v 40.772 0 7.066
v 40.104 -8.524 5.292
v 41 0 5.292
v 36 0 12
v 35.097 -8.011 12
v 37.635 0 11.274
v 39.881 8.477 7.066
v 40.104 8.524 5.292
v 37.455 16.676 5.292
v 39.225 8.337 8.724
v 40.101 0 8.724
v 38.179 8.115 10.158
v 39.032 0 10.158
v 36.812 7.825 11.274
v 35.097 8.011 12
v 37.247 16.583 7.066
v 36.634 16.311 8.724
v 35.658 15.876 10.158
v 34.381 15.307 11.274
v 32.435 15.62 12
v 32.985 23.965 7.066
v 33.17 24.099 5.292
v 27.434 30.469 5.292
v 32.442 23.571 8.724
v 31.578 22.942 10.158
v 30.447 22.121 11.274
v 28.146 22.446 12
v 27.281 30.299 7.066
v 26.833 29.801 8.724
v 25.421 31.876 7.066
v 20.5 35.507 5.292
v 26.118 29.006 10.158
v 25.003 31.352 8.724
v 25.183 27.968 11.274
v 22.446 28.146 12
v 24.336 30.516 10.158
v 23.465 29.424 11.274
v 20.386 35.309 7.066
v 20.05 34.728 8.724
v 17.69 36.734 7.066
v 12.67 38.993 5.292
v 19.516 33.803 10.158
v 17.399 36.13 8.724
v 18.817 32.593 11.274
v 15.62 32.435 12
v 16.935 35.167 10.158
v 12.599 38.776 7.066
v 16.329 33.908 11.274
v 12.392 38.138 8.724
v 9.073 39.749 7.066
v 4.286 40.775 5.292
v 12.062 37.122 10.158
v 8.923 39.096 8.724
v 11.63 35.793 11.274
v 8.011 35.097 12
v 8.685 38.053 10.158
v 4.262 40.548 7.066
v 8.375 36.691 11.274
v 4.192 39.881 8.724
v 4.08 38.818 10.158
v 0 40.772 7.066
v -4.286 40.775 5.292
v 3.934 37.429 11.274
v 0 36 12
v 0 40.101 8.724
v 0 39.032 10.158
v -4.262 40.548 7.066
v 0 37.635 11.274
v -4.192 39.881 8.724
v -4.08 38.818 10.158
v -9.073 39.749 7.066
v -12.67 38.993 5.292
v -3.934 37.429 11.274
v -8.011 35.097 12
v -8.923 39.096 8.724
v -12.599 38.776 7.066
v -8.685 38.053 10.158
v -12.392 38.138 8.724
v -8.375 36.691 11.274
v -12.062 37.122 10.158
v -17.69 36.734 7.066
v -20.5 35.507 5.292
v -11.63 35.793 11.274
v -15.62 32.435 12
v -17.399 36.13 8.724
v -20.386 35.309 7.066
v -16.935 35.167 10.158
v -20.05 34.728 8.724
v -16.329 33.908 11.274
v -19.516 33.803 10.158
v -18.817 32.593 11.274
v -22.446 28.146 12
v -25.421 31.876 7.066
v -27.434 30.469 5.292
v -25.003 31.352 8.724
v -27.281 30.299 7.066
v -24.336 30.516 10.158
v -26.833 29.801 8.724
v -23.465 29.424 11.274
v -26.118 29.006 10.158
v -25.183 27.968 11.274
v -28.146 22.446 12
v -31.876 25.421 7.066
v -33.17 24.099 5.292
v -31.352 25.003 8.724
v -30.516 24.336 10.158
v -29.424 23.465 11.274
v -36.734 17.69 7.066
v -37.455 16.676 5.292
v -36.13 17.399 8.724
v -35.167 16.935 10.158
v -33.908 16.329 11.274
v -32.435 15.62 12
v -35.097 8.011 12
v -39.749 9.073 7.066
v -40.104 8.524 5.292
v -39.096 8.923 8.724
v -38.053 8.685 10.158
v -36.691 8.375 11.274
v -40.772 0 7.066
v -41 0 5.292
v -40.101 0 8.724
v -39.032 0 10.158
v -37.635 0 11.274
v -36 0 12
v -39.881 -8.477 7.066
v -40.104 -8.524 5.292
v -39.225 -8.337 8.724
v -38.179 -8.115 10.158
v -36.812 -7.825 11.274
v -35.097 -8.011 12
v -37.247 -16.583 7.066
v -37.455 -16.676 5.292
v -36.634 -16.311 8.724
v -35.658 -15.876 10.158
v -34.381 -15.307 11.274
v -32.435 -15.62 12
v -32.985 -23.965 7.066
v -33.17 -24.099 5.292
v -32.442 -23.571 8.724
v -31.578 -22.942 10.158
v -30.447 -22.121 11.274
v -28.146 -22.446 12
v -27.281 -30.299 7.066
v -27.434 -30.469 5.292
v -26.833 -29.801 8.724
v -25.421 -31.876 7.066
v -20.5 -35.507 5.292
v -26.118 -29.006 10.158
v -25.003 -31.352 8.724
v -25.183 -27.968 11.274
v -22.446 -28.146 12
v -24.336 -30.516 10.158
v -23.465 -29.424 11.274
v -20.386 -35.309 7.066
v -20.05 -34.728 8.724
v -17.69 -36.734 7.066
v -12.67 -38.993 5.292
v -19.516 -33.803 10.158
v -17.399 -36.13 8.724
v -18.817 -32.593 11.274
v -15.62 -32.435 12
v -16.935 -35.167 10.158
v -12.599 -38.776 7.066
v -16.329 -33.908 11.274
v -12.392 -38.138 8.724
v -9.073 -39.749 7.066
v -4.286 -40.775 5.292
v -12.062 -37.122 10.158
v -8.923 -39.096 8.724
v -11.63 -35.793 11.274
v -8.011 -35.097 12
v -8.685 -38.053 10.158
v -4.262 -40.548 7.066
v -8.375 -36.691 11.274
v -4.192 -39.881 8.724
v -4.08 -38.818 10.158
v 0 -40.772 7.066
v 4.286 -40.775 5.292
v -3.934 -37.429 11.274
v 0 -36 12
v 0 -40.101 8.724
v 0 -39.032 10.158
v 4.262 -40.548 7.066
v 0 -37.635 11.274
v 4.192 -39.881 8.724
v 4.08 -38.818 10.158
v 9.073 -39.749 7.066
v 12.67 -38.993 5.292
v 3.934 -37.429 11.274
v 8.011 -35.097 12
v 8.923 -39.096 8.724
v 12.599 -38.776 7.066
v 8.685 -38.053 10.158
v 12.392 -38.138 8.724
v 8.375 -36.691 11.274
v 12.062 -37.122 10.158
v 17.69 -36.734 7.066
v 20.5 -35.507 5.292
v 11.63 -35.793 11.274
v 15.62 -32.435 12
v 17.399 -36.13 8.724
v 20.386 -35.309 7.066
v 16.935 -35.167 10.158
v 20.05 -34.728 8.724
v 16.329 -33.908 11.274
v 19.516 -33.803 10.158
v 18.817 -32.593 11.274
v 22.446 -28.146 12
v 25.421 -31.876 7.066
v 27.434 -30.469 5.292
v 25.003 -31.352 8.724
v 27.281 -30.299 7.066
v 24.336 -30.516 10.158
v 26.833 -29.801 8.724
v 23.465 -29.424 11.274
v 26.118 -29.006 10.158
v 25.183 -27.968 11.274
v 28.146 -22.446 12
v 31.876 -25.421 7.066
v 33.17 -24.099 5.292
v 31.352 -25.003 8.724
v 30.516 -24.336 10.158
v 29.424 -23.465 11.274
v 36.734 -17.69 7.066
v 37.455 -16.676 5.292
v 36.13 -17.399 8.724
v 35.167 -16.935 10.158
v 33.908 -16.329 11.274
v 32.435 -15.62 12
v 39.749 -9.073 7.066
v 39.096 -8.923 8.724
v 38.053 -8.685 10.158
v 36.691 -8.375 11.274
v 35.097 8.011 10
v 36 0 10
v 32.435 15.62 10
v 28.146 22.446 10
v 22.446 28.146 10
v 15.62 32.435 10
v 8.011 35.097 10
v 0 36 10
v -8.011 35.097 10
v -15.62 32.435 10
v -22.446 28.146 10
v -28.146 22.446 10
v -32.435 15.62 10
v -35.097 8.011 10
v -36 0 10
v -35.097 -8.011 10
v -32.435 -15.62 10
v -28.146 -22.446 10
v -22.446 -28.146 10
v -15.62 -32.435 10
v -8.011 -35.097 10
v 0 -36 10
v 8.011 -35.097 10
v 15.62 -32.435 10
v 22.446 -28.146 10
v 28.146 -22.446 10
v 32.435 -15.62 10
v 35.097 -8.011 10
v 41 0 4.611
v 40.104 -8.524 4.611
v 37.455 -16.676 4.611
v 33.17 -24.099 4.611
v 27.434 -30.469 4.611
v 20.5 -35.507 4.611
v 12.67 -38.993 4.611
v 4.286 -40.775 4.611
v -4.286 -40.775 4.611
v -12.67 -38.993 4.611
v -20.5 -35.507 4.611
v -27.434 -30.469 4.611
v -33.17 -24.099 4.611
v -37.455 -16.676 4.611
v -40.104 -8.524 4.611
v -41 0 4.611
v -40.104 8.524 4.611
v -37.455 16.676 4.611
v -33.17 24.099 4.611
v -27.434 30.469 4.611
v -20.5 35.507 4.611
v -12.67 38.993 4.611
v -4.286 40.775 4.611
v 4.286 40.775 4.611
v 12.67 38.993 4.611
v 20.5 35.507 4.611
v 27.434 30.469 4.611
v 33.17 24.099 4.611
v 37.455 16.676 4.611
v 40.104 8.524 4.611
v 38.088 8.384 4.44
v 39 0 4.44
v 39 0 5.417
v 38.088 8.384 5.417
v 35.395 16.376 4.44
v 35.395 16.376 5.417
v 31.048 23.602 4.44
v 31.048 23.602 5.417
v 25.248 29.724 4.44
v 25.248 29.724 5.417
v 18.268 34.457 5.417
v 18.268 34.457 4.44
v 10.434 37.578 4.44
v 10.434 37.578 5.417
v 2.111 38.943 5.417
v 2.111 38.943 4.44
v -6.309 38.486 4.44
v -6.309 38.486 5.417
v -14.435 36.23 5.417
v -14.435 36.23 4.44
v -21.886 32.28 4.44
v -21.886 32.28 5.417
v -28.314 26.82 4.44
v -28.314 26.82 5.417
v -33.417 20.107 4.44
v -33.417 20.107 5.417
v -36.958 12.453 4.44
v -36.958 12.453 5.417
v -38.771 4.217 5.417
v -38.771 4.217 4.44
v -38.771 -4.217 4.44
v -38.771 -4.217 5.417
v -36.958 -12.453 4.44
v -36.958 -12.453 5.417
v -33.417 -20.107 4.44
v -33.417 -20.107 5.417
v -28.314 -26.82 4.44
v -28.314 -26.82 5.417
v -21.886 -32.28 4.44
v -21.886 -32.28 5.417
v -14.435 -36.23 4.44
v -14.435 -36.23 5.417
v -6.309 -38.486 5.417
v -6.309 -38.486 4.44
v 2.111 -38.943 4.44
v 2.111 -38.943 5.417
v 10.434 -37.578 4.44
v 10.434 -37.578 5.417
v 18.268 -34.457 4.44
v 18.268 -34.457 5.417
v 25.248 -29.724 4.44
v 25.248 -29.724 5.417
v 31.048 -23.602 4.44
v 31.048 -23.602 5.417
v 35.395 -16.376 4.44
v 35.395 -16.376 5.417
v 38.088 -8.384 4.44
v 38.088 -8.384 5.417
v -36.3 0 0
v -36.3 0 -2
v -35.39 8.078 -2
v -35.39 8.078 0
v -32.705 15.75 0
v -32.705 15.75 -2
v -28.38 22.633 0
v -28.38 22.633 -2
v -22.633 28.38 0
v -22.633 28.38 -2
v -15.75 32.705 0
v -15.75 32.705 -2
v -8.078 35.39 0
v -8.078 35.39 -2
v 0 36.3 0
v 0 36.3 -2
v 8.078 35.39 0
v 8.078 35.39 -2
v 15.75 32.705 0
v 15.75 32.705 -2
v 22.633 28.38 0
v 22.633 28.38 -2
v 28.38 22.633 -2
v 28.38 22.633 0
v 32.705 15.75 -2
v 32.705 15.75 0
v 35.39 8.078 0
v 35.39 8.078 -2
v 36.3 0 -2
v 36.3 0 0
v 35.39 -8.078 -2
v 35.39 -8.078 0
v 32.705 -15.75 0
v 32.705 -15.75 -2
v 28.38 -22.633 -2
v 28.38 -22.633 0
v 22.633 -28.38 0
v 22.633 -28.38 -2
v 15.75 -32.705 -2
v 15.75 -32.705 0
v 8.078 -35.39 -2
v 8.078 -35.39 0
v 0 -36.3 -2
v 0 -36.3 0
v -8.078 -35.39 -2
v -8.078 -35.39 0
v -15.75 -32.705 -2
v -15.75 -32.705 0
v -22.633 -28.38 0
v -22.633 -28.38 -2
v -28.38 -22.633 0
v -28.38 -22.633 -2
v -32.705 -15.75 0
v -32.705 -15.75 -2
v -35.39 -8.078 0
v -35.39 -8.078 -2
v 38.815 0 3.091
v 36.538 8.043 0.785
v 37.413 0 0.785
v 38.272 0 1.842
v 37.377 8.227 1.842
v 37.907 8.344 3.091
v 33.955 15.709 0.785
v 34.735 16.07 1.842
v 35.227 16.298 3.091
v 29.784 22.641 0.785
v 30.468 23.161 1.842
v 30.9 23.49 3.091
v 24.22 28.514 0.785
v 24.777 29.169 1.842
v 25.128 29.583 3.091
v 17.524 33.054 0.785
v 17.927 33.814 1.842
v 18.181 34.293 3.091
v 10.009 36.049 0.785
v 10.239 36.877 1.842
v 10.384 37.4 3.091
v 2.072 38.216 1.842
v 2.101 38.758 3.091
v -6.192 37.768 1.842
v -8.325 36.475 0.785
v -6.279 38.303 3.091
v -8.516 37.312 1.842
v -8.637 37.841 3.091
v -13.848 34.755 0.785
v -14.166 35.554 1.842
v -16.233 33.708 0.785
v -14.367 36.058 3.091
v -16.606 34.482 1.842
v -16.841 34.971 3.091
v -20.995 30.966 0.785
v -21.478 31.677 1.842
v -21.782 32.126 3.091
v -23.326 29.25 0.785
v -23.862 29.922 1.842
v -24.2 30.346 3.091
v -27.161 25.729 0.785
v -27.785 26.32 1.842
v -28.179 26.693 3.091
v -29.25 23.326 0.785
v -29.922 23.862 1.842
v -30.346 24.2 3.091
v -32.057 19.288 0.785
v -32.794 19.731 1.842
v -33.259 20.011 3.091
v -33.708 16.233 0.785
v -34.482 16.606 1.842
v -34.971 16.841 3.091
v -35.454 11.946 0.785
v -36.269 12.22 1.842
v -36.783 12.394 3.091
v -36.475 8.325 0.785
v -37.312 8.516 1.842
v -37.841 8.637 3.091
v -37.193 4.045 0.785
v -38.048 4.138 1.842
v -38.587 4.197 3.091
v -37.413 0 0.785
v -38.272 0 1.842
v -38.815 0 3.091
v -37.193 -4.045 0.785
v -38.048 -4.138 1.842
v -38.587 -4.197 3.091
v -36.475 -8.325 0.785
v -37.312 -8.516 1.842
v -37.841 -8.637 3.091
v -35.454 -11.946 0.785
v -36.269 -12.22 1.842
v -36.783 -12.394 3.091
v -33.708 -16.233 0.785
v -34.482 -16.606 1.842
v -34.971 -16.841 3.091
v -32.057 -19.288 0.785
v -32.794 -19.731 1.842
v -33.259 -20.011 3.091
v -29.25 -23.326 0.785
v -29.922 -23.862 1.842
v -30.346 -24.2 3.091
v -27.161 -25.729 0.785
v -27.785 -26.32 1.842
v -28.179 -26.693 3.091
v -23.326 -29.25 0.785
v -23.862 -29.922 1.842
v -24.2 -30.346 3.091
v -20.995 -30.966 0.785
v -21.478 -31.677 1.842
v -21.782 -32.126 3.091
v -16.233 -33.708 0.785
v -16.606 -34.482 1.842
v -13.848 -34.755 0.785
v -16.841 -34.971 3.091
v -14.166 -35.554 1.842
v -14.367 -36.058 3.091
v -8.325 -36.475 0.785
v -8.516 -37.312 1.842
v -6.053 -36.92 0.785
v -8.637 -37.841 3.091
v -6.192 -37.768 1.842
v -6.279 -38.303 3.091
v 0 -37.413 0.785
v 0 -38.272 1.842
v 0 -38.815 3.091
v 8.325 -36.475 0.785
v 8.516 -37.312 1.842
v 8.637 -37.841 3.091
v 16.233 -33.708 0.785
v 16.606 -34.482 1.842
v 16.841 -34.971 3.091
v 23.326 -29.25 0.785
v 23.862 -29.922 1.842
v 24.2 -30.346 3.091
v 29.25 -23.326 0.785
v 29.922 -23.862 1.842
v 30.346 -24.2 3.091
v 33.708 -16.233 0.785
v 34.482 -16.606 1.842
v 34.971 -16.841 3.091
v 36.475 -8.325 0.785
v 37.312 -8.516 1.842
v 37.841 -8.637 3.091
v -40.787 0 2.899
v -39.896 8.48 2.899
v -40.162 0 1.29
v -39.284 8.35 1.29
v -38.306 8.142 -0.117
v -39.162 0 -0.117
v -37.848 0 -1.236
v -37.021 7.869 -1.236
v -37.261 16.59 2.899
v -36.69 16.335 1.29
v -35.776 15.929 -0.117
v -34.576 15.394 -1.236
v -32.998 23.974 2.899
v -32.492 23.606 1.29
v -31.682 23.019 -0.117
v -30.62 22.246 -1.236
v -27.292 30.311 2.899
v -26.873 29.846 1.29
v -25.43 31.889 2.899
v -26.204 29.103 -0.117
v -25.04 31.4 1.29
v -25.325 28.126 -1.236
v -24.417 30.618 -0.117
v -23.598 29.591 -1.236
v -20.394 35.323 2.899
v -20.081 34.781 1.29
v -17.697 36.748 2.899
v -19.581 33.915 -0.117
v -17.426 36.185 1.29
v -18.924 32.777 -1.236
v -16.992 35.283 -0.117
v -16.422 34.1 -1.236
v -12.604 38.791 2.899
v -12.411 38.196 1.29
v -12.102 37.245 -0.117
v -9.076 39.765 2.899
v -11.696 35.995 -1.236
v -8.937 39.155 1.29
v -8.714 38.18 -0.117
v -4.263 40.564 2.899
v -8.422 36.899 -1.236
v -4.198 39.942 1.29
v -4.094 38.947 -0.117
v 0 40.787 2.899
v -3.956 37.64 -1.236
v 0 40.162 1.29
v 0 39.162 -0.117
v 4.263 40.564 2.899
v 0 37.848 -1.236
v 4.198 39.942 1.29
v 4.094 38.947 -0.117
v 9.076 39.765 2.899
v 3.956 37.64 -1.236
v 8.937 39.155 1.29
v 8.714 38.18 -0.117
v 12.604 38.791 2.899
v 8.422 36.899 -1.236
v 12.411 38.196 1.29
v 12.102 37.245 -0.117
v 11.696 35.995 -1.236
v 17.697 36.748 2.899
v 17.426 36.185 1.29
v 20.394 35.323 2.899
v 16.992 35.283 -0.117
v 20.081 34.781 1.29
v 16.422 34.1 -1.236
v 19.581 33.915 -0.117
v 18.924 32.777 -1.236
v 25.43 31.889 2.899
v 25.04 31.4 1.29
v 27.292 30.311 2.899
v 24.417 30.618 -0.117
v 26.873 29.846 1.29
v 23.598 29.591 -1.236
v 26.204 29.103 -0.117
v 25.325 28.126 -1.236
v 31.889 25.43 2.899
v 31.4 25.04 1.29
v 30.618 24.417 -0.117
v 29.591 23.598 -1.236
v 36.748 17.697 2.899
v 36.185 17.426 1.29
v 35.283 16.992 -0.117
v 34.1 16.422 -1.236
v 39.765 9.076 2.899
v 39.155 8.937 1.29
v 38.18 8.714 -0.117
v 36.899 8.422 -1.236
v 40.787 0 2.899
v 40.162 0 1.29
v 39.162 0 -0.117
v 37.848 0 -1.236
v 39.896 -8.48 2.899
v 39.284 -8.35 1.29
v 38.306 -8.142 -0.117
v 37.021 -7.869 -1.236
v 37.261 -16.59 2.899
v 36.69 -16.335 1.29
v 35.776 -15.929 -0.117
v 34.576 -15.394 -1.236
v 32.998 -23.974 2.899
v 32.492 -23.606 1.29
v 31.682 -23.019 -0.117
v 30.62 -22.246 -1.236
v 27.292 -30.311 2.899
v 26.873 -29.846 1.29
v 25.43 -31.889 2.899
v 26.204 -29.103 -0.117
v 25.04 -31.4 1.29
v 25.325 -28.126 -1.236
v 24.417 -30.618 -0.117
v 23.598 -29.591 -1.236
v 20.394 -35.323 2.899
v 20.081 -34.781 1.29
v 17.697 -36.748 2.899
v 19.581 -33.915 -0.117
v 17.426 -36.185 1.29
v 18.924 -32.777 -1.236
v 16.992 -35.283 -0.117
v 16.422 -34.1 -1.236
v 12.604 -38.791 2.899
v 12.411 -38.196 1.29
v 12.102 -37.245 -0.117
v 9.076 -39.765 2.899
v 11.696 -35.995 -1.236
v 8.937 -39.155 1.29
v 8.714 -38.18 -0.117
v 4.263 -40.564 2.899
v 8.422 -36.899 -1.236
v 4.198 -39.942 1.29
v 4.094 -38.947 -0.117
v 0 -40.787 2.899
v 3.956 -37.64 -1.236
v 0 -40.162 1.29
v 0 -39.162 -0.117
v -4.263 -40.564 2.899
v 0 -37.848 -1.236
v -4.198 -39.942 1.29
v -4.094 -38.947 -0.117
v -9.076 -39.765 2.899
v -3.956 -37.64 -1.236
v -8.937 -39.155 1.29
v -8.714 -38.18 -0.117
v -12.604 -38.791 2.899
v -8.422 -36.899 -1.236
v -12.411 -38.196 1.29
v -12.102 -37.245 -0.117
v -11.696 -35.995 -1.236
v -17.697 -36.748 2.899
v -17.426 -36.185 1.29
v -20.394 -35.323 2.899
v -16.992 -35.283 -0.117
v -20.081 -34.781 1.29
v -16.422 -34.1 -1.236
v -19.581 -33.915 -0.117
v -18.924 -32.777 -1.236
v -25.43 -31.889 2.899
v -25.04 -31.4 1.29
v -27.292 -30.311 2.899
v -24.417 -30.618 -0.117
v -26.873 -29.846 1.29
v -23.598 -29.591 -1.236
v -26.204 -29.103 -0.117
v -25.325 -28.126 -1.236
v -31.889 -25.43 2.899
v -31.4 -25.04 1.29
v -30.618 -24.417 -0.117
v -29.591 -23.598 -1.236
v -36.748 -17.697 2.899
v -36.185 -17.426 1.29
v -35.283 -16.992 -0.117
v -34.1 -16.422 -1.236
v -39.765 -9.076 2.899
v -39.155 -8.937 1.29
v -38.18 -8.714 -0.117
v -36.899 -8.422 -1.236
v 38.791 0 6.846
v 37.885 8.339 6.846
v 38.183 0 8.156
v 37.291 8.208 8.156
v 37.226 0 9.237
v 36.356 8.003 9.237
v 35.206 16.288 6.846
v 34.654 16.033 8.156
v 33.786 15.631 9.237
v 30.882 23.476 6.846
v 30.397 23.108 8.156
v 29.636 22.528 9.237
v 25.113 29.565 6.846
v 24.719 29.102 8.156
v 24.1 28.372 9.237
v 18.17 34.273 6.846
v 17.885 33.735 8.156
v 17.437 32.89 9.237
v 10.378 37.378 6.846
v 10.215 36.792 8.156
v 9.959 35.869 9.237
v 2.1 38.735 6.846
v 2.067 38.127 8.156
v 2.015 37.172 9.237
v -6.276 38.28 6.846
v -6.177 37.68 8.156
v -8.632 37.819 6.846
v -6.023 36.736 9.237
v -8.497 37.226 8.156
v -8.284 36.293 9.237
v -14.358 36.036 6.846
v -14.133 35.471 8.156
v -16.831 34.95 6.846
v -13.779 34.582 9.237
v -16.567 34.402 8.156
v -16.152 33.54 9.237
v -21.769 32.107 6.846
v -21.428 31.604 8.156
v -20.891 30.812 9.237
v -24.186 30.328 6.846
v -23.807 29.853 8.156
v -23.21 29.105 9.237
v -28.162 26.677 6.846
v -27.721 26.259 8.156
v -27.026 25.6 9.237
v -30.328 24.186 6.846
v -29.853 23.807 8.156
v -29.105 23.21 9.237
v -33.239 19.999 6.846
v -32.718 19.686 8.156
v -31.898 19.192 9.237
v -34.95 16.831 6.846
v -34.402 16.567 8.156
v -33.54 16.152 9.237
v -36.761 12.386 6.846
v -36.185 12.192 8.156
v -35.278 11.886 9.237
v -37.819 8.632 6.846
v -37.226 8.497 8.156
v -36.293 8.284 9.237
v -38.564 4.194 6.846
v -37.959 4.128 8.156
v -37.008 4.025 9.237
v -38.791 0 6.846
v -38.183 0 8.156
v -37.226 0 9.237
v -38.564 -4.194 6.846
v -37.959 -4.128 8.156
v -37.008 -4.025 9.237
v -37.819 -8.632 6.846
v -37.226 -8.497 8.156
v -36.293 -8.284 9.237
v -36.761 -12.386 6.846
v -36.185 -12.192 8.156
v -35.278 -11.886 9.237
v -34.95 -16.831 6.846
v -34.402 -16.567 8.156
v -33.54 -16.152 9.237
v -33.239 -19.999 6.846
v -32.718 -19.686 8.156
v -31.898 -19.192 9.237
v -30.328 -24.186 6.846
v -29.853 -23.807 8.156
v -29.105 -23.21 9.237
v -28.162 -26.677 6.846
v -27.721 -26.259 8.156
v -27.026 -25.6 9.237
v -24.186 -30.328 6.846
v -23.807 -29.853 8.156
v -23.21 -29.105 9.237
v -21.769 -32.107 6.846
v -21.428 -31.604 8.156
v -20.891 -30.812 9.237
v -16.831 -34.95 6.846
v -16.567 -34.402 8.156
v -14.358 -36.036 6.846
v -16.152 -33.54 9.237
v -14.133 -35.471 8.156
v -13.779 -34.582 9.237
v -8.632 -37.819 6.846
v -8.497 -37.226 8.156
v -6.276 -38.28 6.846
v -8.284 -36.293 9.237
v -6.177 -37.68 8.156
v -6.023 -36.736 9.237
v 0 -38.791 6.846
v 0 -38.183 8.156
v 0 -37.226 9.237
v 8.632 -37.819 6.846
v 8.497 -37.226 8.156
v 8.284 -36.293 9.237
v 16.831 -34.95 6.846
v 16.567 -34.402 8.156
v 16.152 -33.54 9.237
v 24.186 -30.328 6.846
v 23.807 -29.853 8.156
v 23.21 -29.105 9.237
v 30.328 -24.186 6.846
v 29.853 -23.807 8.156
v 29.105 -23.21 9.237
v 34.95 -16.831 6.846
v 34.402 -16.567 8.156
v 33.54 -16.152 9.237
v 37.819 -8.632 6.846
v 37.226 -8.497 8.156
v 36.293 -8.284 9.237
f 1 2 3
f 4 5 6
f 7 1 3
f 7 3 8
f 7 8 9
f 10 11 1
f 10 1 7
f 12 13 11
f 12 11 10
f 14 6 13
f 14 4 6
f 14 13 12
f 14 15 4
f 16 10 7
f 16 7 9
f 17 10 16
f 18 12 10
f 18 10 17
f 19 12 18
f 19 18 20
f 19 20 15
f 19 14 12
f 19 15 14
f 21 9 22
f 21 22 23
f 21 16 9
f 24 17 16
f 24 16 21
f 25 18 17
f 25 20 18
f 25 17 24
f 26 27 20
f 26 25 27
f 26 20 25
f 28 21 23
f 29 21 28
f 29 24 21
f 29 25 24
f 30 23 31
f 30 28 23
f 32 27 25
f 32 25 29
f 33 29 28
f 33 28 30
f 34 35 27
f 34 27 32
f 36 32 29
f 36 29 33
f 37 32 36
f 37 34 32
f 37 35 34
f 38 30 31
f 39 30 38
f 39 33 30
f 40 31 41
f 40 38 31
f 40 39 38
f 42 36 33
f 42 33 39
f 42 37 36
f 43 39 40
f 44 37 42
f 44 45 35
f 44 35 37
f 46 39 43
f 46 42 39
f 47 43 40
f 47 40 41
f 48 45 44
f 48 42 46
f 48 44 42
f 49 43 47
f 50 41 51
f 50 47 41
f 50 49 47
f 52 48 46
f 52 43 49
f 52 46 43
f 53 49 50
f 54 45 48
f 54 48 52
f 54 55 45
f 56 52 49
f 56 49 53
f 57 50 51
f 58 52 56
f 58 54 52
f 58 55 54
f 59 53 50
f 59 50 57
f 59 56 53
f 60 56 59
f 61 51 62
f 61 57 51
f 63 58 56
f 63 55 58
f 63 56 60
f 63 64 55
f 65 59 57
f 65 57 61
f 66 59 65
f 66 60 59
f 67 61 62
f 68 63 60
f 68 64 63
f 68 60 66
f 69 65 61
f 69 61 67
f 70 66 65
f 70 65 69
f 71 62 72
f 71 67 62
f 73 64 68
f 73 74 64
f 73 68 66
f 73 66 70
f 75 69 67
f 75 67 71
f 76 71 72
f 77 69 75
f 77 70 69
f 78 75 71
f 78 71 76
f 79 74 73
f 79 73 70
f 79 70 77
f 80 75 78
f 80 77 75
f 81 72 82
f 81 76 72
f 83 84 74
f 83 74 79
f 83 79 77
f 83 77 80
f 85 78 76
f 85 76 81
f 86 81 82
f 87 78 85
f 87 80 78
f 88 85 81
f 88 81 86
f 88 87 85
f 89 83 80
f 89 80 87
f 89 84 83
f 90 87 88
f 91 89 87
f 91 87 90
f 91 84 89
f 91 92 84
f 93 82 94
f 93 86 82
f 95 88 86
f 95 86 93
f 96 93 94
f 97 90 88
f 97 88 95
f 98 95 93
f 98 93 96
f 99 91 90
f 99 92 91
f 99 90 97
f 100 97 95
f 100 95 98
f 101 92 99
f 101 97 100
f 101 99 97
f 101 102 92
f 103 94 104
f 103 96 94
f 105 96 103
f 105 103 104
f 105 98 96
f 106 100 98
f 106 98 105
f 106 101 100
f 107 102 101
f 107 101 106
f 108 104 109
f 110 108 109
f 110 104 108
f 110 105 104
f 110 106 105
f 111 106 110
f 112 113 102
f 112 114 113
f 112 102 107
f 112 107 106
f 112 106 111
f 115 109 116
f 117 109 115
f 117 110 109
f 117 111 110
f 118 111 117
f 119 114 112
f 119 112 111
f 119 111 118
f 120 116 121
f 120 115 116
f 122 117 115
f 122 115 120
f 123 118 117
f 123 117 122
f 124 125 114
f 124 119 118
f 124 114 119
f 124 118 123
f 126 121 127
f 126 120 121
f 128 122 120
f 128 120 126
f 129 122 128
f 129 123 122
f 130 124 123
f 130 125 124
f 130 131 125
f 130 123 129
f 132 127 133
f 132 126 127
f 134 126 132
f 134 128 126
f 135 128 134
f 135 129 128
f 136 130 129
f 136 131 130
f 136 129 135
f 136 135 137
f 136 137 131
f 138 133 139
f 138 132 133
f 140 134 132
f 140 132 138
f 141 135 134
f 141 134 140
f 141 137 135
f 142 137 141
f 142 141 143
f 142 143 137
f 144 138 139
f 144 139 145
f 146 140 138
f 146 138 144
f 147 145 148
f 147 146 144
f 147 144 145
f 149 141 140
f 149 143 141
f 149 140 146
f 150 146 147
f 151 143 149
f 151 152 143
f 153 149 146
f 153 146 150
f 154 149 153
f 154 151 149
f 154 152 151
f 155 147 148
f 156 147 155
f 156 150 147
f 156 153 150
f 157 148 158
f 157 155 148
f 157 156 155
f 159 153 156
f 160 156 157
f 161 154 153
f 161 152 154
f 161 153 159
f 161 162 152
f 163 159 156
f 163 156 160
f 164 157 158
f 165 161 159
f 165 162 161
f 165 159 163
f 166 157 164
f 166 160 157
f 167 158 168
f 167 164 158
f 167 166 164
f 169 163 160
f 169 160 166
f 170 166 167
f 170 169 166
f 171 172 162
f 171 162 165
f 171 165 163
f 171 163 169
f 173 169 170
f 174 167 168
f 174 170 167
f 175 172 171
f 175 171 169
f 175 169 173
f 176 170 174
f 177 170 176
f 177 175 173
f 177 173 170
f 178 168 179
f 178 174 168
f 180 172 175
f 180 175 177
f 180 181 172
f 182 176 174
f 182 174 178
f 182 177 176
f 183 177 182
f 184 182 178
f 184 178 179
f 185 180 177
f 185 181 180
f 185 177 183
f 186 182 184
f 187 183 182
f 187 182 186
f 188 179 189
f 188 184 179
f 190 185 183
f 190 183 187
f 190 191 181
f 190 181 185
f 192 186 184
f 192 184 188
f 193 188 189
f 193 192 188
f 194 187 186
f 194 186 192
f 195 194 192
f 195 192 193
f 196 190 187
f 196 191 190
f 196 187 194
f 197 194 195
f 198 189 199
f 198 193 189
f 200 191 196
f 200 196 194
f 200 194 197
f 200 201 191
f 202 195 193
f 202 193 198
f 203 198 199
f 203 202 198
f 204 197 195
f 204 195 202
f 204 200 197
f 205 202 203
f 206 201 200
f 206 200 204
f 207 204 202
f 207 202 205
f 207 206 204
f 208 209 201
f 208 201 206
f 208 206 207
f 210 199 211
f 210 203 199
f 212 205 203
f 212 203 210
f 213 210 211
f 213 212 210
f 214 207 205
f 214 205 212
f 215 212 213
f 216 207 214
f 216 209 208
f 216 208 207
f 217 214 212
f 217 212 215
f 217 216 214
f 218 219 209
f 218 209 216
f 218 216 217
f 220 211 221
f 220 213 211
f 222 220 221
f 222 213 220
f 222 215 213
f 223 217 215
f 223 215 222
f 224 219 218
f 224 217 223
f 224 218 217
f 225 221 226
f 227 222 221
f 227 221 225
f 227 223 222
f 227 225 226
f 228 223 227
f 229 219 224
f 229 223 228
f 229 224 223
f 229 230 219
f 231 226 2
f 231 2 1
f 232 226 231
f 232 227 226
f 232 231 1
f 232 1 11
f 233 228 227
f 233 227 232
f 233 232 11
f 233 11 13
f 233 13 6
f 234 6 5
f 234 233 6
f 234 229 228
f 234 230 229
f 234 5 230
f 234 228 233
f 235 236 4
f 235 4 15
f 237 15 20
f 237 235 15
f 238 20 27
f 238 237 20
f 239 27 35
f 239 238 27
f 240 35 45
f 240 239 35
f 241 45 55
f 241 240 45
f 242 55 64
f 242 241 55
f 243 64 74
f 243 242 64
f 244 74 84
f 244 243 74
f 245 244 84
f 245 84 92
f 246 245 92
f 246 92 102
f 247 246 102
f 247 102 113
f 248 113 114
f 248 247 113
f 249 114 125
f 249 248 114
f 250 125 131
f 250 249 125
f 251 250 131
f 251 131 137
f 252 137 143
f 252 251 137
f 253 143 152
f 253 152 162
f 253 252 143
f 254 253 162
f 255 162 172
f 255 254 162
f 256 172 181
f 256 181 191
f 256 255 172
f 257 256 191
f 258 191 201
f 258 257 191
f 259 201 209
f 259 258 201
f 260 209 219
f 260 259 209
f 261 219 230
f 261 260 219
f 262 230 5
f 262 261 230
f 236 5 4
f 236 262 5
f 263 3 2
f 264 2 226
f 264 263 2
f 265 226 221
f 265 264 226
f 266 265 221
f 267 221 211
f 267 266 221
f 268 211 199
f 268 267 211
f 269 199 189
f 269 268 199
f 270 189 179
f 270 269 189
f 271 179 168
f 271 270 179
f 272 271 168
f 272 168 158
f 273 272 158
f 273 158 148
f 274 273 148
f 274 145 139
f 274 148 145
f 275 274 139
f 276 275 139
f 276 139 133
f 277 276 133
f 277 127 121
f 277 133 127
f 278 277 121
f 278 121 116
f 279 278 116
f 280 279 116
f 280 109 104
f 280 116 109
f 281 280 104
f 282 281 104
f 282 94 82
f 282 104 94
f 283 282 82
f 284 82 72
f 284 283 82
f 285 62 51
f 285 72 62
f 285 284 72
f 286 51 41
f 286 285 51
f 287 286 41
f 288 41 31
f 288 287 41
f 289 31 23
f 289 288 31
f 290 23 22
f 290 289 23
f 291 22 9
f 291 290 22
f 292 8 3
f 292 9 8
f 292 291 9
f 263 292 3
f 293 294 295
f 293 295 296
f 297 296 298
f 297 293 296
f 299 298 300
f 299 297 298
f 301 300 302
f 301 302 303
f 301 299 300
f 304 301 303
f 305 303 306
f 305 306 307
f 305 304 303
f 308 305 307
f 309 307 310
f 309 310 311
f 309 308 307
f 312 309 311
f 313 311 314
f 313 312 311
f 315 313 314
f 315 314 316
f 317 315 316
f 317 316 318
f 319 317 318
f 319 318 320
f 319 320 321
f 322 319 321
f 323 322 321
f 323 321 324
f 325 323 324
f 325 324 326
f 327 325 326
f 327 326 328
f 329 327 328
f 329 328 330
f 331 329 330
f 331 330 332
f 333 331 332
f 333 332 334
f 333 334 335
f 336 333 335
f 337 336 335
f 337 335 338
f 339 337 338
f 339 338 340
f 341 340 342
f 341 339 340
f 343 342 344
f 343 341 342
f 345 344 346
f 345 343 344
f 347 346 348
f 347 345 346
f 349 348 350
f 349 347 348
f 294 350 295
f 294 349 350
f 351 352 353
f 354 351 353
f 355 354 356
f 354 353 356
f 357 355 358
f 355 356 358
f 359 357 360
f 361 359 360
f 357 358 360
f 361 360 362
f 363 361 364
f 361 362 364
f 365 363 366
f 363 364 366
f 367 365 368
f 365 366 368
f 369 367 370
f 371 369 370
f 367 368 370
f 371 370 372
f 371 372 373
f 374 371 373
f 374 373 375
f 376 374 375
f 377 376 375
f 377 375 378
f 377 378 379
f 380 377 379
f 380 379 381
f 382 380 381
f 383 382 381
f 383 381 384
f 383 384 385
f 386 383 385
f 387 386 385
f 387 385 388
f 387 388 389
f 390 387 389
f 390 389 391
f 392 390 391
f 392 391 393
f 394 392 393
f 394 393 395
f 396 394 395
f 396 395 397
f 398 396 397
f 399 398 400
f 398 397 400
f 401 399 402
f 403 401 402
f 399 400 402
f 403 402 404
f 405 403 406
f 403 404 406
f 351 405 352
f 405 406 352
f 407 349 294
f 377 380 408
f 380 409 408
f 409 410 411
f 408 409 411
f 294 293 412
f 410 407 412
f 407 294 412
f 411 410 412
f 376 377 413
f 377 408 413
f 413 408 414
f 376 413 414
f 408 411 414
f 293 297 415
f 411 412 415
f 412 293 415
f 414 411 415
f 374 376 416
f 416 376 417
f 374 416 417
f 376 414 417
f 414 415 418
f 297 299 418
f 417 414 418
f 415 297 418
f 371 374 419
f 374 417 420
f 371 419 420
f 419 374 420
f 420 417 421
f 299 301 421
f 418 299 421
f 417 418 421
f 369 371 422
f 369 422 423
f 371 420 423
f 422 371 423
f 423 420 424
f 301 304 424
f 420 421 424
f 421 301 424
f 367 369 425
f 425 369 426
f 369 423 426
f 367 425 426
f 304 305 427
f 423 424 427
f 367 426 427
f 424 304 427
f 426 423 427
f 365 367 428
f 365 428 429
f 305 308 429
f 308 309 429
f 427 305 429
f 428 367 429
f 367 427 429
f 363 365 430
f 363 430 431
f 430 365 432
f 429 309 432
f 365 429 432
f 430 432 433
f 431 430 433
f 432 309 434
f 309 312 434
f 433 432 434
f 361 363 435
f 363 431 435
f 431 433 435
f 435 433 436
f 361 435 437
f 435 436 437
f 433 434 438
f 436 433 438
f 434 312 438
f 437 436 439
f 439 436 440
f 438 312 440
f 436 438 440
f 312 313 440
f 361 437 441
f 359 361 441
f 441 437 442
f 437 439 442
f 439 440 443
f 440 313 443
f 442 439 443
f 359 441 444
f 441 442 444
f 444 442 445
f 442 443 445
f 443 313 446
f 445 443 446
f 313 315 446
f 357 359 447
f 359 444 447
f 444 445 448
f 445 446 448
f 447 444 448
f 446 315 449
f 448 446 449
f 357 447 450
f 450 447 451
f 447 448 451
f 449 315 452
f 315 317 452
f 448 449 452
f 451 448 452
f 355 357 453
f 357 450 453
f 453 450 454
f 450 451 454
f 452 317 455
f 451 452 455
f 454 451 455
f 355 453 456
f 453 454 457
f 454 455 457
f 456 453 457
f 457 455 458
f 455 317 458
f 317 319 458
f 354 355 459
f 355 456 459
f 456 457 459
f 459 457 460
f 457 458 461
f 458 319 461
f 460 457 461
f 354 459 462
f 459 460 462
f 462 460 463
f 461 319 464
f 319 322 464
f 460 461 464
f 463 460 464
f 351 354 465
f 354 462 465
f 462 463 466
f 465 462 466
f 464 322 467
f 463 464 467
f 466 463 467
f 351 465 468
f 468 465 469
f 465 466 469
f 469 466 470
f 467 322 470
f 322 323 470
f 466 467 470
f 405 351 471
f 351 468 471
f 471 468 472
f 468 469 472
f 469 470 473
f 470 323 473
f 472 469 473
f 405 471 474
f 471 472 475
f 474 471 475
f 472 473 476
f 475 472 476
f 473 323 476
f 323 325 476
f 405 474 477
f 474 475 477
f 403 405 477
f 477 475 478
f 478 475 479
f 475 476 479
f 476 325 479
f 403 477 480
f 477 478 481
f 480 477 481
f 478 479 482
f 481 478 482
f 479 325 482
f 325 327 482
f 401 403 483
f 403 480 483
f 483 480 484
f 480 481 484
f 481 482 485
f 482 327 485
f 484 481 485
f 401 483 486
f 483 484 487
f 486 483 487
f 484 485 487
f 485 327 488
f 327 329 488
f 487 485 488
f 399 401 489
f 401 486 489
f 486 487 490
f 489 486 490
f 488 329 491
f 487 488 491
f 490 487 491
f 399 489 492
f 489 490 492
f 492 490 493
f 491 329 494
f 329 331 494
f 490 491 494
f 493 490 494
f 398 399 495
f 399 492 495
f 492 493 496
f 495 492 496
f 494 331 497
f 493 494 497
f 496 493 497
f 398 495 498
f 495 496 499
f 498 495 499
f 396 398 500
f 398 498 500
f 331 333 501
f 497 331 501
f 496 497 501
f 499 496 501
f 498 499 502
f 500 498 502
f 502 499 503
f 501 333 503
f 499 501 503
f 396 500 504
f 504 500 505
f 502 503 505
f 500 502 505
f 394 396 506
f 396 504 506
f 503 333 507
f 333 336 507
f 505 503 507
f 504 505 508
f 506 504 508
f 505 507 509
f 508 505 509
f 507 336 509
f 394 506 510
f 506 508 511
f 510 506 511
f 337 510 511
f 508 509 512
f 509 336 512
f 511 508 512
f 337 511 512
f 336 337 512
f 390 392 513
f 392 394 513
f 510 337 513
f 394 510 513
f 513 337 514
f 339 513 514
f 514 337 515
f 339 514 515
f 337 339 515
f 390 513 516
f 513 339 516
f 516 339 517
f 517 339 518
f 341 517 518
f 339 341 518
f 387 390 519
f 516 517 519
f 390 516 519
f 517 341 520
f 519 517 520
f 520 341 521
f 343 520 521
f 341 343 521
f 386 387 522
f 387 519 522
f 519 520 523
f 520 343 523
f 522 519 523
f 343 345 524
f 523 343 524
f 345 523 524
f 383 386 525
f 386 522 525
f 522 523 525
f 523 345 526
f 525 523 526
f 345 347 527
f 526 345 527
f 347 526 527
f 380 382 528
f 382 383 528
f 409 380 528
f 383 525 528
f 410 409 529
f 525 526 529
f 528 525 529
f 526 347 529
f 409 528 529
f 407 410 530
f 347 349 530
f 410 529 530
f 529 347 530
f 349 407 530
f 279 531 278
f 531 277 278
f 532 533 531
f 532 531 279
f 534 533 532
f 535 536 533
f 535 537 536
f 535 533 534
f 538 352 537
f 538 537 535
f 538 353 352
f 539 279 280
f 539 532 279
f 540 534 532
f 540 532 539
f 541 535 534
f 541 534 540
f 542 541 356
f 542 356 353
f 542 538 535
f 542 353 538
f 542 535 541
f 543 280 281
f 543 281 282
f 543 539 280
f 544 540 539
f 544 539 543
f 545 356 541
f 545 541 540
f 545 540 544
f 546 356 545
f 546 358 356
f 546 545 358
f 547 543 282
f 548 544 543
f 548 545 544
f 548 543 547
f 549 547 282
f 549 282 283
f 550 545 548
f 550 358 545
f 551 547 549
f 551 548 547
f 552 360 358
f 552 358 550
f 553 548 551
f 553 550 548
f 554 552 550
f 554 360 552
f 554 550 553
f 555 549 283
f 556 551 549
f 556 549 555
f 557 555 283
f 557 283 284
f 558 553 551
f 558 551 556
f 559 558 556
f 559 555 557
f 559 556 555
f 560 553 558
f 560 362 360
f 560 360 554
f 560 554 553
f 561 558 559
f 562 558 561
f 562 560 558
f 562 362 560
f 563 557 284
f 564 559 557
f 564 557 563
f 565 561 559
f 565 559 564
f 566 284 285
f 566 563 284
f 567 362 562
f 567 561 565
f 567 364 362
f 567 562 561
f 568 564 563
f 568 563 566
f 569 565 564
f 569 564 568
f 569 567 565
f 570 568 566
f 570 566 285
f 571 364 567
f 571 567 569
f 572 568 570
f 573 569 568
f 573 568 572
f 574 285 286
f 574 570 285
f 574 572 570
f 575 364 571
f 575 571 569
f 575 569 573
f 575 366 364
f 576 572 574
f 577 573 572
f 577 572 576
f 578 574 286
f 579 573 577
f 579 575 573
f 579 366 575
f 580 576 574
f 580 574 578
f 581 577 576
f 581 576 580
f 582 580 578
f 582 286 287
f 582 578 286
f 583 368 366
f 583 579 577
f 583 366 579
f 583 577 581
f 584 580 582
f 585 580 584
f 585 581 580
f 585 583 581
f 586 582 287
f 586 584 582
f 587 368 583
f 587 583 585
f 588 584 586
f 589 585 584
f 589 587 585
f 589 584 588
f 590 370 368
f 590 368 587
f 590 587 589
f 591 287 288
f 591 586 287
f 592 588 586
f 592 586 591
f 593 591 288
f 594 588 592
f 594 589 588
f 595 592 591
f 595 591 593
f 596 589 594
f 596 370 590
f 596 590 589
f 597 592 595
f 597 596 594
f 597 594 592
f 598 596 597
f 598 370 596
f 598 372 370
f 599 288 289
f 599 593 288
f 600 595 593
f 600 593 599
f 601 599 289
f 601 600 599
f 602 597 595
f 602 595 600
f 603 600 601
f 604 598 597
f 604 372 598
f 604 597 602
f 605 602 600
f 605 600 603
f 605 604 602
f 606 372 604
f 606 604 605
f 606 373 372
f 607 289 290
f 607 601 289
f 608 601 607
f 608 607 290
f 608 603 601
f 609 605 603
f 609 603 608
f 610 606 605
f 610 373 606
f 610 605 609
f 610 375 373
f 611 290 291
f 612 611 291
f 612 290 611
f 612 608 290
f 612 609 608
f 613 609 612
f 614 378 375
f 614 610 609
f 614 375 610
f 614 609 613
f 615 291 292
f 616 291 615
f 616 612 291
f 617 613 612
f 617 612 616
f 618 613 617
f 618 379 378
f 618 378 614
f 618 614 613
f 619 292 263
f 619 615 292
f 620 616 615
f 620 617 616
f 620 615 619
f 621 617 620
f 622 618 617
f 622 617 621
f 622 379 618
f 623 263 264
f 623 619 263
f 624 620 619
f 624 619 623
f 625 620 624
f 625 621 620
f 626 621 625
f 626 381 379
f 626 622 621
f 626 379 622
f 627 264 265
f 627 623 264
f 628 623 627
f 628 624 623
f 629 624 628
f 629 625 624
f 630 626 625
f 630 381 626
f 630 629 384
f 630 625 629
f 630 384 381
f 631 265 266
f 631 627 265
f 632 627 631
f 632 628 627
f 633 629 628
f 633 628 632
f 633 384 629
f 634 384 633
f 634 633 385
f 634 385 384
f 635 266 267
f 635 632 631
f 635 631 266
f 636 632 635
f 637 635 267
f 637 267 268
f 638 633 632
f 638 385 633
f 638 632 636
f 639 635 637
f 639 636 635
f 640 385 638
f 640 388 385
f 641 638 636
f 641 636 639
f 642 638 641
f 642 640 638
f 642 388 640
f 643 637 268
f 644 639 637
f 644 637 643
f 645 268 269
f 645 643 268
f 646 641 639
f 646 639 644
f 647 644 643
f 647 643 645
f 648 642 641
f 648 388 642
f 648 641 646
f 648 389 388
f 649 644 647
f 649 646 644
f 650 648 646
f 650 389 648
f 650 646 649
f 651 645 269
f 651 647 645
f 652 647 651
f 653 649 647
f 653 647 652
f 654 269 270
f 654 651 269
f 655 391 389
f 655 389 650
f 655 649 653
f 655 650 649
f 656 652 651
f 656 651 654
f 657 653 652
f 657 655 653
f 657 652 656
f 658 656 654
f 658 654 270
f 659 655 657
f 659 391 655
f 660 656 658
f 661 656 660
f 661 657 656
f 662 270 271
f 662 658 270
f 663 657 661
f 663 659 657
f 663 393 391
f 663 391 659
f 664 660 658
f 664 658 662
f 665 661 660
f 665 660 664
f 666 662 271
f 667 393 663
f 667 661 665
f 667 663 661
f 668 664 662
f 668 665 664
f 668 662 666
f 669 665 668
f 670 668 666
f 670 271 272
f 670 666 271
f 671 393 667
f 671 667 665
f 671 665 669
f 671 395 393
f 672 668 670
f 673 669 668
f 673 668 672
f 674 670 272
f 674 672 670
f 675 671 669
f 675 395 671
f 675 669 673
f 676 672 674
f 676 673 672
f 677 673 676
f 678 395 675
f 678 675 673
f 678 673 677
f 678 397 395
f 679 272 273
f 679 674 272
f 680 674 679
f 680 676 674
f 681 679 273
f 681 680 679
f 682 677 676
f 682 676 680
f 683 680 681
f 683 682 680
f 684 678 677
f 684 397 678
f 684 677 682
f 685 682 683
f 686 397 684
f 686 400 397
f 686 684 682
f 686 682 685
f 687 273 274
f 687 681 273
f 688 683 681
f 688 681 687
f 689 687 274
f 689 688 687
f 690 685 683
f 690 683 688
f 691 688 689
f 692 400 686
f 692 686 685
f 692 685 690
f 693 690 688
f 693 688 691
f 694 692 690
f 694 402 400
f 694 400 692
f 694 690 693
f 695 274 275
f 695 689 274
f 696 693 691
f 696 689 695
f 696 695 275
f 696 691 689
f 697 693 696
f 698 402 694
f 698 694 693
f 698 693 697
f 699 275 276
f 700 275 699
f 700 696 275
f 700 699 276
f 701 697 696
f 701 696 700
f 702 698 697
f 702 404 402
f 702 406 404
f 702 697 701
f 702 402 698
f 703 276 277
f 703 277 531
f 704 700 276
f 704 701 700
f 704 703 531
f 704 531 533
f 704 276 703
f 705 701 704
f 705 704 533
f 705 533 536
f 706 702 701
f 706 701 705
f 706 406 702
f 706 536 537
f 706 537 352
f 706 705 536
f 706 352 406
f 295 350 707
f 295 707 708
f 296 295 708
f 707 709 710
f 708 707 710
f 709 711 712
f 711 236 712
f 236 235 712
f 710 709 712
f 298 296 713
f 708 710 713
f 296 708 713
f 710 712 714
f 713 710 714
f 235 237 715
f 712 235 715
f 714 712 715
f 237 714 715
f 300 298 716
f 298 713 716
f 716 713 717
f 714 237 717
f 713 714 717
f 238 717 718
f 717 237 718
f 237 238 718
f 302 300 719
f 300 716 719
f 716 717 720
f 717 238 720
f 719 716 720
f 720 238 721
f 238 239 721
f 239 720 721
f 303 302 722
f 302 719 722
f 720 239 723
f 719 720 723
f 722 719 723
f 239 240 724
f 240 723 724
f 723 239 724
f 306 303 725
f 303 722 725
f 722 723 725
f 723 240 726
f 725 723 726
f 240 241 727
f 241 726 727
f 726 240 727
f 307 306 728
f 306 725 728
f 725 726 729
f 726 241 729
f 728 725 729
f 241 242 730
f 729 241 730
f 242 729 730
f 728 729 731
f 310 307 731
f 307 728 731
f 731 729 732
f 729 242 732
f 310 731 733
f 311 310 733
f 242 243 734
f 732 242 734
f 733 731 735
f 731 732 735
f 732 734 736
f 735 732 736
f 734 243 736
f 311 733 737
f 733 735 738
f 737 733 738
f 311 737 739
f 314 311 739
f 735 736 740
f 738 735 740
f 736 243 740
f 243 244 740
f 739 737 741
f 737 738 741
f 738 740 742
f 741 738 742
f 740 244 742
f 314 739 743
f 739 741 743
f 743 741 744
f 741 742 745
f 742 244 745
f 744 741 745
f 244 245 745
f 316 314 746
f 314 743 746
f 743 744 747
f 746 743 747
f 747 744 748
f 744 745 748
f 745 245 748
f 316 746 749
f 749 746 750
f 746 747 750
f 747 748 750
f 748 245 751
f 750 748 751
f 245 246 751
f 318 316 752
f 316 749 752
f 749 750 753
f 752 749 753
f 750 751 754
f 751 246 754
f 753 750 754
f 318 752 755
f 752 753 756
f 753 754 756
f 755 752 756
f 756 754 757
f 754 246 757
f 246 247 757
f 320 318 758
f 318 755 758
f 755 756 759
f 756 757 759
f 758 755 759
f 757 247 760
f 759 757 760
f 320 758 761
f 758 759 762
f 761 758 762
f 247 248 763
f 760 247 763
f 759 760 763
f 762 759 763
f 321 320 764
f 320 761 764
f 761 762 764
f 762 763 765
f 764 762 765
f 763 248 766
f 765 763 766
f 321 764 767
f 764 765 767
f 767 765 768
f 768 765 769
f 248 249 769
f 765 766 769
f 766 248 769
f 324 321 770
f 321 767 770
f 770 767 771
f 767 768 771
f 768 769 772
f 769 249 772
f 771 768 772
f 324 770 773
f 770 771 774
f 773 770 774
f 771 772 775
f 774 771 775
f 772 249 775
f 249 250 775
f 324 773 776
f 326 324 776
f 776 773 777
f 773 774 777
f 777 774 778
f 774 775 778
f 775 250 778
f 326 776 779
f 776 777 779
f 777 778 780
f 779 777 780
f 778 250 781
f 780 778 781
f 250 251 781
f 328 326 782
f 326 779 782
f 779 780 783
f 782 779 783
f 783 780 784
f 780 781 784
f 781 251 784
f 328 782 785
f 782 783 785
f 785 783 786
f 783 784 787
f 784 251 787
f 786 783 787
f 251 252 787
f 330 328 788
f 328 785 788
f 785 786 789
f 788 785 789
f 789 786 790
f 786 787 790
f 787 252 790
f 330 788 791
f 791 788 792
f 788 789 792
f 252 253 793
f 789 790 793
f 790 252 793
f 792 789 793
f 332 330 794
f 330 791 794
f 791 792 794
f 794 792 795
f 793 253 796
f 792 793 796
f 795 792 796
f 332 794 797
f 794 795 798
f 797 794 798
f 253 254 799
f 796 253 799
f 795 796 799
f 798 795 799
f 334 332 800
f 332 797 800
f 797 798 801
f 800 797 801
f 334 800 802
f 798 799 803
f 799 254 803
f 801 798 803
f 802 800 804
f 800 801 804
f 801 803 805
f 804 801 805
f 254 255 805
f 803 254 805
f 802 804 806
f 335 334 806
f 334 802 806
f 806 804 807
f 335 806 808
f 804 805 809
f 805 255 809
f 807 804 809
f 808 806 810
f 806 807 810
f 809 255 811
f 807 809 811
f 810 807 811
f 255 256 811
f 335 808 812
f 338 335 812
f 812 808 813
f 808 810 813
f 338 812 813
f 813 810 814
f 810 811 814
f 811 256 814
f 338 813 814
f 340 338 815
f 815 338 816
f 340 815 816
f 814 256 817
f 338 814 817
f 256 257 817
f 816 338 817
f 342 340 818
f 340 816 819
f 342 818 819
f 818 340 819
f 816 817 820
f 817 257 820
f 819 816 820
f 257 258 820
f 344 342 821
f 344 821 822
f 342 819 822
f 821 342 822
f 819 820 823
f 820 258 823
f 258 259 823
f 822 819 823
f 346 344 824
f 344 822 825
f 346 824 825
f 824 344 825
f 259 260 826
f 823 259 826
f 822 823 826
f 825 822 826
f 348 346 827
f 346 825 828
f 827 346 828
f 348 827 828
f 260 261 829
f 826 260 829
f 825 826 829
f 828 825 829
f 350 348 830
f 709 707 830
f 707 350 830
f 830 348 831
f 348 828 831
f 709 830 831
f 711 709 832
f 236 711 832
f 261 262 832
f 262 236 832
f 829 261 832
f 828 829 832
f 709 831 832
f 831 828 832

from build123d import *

# Parameters (mm, degrees)
SKETCH1_R           = 41
SKETCH1_R_2         = 39
BOSS_EXTRUDE1_DEPTH = 10
SKETCH2_R           = 41
SKETCH2_R_2         = 36
BOSS_EXTRUDE2_DEPTH = 2
BOSS_EXTRUDE3_START = 2
SKETCH3_R           = 41
SKETCH3_R_2         = 36.3
BOSS_EXTRUDE3_DEPTH = 2
FILLET2_R           = 5
FILLET6_R           = 7


with BuildPart() as part:
    # Sketch1 → Boss-Extrude1 (new body)
    with BuildSketch(Plane.XY):
        Circle(SKETCH1_R)
        Circle(SKETCH1_R_2, mode=Mode.SUBTRACT)
    extrude(amount=BOSS_EXTRUDE1_DEPTH)

    # Sketch2 → Boss-Extrude2 (add)
    with BuildSketch(Plane.XY.offset(10)):
        Circle(SKETCH2_R)
        Circle(SKETCH2_R_2, mode=Mode.SUBTRACT)
    extrude(amount=BOSS_EXTRUDE2_DEPTH)

    # Sketch3 → Boss-Extrude3 (add)
    with BuildSketch(Plane(origin=(0, 0, 0), x_dir=(-1, 0, 0), z_dir=(0, 0, -1)).offset(BOSS_EXTRUDE3_START)):
        Circle(SKETCH3_R)
        Circle(SKETCH3_R_2, mode=Mode.SUBTRACT)
    extrude(amount=-BOSS_EXTRUDE3_DEPTH)

    # Fillet2
    # the kernel refuses this fillet: 5 mm, written as the material it adds along each edge
    with BuildSketch(Plane(origin=(0, 0, 10), x_dir=(1, 0, 0), z_dir=(0, -1, 0))) as fillet2_piece_1:
        with BuildLine():
            CenterArc((34, -4.582575695), FILLET2_R, 0, 66.421821522)
            Line((39, -4.582575695), (39.1, -4.582575695))
            Line((39.1, -4.582575695), (39.1, 0))
            Line((39.1, 0), (39, 0.1))
            ThreePointArc((39, 0.1), (37.5, 0.1), (36.04, 0.091651514))
            Line((36.04, 0.091651514), (36, 0))
        make_face()
    revolve(axis=Axis((0, 0, 10), (0, 0, 1)))
    with BuildSketch(Plane(origin=(0, 0, 0), x_dir=(1, 0, 0), z_dir=(0, -1, 0))) as fillet2_piece_2:
        with BuildLine():
            CenterArc((34, 4.439594576), FILLET2_R, 297.387107503, 62.612892497)
            Line((36.3, 0), (36.346, -0.088791892))
            ThreePointArc((36.346, -0.088791892), (37.65, -0.1), (39, -0.1))
            Line((39, -0.1), (39.1, 0))
            Line((39.1, 0), (39.1, 4.439594576))
            Line((39.1, 4.439594576), (39, 4.439594576))
        make_face()
    revolve(axis=Axis((0, 0, 0), (0, 0, 1)))

    # Fillet6
    # the kernel refuses this fillet: 7 mm, written as the material it takes off along each edge
    with BuildSketch(Plane(origin=(0, 0, -2), x_dir=(-1, 0, 0), z_dir=(0, -1, 0))) as fillet6_piece_1:
        with BuildLine():
            CenterArc((34, -6.61135387), FILLET6_R, 0, 70.817910057)
            Line((41, -6.61135387), (41.14, -6.61135387))
            Line((41.14, -6.61135387), (41.14, 0))
            Line((41.14, 0), (41, 0.14))
            ThreePointArc((41, 0.14), (38.65, 0.14), (36.346, 0.132227077))
            Line((36.346, 0.132227077), (36.3, 0))
        make_face()
    revolve(axis=Axis((0, 0, -2), (0, 0, -1)), mode=Mode.SUBTRACT)
    with BuildSketch(Plane(origin=(0, 0, 12), x_dir=(1, 0, 0), z_dir=(0, -1, 0))) as fillet6_piece_2:
        with BuildLine():
            CenterArc((34, -6.708203932), FILLET6_R, 0, 73.398450401)
            Line((36, 0), (36.04, 0.134164079))
            ThreePointArc((36.04, 0.134164079), (38.5, 0.14), (41, 0.14))
            Line((41, 0.14), (41.14, 0))
            Line((41.14, 0), (41.14, -6.708203932))
            Line((41.14, -6.708203932), (41, -6.708203932))
        make_face()
    revolve(axis=Axis((0, 0, 12), (0, 0, 1)), mode=Mode.SUBTRACT)


solid = part.part
